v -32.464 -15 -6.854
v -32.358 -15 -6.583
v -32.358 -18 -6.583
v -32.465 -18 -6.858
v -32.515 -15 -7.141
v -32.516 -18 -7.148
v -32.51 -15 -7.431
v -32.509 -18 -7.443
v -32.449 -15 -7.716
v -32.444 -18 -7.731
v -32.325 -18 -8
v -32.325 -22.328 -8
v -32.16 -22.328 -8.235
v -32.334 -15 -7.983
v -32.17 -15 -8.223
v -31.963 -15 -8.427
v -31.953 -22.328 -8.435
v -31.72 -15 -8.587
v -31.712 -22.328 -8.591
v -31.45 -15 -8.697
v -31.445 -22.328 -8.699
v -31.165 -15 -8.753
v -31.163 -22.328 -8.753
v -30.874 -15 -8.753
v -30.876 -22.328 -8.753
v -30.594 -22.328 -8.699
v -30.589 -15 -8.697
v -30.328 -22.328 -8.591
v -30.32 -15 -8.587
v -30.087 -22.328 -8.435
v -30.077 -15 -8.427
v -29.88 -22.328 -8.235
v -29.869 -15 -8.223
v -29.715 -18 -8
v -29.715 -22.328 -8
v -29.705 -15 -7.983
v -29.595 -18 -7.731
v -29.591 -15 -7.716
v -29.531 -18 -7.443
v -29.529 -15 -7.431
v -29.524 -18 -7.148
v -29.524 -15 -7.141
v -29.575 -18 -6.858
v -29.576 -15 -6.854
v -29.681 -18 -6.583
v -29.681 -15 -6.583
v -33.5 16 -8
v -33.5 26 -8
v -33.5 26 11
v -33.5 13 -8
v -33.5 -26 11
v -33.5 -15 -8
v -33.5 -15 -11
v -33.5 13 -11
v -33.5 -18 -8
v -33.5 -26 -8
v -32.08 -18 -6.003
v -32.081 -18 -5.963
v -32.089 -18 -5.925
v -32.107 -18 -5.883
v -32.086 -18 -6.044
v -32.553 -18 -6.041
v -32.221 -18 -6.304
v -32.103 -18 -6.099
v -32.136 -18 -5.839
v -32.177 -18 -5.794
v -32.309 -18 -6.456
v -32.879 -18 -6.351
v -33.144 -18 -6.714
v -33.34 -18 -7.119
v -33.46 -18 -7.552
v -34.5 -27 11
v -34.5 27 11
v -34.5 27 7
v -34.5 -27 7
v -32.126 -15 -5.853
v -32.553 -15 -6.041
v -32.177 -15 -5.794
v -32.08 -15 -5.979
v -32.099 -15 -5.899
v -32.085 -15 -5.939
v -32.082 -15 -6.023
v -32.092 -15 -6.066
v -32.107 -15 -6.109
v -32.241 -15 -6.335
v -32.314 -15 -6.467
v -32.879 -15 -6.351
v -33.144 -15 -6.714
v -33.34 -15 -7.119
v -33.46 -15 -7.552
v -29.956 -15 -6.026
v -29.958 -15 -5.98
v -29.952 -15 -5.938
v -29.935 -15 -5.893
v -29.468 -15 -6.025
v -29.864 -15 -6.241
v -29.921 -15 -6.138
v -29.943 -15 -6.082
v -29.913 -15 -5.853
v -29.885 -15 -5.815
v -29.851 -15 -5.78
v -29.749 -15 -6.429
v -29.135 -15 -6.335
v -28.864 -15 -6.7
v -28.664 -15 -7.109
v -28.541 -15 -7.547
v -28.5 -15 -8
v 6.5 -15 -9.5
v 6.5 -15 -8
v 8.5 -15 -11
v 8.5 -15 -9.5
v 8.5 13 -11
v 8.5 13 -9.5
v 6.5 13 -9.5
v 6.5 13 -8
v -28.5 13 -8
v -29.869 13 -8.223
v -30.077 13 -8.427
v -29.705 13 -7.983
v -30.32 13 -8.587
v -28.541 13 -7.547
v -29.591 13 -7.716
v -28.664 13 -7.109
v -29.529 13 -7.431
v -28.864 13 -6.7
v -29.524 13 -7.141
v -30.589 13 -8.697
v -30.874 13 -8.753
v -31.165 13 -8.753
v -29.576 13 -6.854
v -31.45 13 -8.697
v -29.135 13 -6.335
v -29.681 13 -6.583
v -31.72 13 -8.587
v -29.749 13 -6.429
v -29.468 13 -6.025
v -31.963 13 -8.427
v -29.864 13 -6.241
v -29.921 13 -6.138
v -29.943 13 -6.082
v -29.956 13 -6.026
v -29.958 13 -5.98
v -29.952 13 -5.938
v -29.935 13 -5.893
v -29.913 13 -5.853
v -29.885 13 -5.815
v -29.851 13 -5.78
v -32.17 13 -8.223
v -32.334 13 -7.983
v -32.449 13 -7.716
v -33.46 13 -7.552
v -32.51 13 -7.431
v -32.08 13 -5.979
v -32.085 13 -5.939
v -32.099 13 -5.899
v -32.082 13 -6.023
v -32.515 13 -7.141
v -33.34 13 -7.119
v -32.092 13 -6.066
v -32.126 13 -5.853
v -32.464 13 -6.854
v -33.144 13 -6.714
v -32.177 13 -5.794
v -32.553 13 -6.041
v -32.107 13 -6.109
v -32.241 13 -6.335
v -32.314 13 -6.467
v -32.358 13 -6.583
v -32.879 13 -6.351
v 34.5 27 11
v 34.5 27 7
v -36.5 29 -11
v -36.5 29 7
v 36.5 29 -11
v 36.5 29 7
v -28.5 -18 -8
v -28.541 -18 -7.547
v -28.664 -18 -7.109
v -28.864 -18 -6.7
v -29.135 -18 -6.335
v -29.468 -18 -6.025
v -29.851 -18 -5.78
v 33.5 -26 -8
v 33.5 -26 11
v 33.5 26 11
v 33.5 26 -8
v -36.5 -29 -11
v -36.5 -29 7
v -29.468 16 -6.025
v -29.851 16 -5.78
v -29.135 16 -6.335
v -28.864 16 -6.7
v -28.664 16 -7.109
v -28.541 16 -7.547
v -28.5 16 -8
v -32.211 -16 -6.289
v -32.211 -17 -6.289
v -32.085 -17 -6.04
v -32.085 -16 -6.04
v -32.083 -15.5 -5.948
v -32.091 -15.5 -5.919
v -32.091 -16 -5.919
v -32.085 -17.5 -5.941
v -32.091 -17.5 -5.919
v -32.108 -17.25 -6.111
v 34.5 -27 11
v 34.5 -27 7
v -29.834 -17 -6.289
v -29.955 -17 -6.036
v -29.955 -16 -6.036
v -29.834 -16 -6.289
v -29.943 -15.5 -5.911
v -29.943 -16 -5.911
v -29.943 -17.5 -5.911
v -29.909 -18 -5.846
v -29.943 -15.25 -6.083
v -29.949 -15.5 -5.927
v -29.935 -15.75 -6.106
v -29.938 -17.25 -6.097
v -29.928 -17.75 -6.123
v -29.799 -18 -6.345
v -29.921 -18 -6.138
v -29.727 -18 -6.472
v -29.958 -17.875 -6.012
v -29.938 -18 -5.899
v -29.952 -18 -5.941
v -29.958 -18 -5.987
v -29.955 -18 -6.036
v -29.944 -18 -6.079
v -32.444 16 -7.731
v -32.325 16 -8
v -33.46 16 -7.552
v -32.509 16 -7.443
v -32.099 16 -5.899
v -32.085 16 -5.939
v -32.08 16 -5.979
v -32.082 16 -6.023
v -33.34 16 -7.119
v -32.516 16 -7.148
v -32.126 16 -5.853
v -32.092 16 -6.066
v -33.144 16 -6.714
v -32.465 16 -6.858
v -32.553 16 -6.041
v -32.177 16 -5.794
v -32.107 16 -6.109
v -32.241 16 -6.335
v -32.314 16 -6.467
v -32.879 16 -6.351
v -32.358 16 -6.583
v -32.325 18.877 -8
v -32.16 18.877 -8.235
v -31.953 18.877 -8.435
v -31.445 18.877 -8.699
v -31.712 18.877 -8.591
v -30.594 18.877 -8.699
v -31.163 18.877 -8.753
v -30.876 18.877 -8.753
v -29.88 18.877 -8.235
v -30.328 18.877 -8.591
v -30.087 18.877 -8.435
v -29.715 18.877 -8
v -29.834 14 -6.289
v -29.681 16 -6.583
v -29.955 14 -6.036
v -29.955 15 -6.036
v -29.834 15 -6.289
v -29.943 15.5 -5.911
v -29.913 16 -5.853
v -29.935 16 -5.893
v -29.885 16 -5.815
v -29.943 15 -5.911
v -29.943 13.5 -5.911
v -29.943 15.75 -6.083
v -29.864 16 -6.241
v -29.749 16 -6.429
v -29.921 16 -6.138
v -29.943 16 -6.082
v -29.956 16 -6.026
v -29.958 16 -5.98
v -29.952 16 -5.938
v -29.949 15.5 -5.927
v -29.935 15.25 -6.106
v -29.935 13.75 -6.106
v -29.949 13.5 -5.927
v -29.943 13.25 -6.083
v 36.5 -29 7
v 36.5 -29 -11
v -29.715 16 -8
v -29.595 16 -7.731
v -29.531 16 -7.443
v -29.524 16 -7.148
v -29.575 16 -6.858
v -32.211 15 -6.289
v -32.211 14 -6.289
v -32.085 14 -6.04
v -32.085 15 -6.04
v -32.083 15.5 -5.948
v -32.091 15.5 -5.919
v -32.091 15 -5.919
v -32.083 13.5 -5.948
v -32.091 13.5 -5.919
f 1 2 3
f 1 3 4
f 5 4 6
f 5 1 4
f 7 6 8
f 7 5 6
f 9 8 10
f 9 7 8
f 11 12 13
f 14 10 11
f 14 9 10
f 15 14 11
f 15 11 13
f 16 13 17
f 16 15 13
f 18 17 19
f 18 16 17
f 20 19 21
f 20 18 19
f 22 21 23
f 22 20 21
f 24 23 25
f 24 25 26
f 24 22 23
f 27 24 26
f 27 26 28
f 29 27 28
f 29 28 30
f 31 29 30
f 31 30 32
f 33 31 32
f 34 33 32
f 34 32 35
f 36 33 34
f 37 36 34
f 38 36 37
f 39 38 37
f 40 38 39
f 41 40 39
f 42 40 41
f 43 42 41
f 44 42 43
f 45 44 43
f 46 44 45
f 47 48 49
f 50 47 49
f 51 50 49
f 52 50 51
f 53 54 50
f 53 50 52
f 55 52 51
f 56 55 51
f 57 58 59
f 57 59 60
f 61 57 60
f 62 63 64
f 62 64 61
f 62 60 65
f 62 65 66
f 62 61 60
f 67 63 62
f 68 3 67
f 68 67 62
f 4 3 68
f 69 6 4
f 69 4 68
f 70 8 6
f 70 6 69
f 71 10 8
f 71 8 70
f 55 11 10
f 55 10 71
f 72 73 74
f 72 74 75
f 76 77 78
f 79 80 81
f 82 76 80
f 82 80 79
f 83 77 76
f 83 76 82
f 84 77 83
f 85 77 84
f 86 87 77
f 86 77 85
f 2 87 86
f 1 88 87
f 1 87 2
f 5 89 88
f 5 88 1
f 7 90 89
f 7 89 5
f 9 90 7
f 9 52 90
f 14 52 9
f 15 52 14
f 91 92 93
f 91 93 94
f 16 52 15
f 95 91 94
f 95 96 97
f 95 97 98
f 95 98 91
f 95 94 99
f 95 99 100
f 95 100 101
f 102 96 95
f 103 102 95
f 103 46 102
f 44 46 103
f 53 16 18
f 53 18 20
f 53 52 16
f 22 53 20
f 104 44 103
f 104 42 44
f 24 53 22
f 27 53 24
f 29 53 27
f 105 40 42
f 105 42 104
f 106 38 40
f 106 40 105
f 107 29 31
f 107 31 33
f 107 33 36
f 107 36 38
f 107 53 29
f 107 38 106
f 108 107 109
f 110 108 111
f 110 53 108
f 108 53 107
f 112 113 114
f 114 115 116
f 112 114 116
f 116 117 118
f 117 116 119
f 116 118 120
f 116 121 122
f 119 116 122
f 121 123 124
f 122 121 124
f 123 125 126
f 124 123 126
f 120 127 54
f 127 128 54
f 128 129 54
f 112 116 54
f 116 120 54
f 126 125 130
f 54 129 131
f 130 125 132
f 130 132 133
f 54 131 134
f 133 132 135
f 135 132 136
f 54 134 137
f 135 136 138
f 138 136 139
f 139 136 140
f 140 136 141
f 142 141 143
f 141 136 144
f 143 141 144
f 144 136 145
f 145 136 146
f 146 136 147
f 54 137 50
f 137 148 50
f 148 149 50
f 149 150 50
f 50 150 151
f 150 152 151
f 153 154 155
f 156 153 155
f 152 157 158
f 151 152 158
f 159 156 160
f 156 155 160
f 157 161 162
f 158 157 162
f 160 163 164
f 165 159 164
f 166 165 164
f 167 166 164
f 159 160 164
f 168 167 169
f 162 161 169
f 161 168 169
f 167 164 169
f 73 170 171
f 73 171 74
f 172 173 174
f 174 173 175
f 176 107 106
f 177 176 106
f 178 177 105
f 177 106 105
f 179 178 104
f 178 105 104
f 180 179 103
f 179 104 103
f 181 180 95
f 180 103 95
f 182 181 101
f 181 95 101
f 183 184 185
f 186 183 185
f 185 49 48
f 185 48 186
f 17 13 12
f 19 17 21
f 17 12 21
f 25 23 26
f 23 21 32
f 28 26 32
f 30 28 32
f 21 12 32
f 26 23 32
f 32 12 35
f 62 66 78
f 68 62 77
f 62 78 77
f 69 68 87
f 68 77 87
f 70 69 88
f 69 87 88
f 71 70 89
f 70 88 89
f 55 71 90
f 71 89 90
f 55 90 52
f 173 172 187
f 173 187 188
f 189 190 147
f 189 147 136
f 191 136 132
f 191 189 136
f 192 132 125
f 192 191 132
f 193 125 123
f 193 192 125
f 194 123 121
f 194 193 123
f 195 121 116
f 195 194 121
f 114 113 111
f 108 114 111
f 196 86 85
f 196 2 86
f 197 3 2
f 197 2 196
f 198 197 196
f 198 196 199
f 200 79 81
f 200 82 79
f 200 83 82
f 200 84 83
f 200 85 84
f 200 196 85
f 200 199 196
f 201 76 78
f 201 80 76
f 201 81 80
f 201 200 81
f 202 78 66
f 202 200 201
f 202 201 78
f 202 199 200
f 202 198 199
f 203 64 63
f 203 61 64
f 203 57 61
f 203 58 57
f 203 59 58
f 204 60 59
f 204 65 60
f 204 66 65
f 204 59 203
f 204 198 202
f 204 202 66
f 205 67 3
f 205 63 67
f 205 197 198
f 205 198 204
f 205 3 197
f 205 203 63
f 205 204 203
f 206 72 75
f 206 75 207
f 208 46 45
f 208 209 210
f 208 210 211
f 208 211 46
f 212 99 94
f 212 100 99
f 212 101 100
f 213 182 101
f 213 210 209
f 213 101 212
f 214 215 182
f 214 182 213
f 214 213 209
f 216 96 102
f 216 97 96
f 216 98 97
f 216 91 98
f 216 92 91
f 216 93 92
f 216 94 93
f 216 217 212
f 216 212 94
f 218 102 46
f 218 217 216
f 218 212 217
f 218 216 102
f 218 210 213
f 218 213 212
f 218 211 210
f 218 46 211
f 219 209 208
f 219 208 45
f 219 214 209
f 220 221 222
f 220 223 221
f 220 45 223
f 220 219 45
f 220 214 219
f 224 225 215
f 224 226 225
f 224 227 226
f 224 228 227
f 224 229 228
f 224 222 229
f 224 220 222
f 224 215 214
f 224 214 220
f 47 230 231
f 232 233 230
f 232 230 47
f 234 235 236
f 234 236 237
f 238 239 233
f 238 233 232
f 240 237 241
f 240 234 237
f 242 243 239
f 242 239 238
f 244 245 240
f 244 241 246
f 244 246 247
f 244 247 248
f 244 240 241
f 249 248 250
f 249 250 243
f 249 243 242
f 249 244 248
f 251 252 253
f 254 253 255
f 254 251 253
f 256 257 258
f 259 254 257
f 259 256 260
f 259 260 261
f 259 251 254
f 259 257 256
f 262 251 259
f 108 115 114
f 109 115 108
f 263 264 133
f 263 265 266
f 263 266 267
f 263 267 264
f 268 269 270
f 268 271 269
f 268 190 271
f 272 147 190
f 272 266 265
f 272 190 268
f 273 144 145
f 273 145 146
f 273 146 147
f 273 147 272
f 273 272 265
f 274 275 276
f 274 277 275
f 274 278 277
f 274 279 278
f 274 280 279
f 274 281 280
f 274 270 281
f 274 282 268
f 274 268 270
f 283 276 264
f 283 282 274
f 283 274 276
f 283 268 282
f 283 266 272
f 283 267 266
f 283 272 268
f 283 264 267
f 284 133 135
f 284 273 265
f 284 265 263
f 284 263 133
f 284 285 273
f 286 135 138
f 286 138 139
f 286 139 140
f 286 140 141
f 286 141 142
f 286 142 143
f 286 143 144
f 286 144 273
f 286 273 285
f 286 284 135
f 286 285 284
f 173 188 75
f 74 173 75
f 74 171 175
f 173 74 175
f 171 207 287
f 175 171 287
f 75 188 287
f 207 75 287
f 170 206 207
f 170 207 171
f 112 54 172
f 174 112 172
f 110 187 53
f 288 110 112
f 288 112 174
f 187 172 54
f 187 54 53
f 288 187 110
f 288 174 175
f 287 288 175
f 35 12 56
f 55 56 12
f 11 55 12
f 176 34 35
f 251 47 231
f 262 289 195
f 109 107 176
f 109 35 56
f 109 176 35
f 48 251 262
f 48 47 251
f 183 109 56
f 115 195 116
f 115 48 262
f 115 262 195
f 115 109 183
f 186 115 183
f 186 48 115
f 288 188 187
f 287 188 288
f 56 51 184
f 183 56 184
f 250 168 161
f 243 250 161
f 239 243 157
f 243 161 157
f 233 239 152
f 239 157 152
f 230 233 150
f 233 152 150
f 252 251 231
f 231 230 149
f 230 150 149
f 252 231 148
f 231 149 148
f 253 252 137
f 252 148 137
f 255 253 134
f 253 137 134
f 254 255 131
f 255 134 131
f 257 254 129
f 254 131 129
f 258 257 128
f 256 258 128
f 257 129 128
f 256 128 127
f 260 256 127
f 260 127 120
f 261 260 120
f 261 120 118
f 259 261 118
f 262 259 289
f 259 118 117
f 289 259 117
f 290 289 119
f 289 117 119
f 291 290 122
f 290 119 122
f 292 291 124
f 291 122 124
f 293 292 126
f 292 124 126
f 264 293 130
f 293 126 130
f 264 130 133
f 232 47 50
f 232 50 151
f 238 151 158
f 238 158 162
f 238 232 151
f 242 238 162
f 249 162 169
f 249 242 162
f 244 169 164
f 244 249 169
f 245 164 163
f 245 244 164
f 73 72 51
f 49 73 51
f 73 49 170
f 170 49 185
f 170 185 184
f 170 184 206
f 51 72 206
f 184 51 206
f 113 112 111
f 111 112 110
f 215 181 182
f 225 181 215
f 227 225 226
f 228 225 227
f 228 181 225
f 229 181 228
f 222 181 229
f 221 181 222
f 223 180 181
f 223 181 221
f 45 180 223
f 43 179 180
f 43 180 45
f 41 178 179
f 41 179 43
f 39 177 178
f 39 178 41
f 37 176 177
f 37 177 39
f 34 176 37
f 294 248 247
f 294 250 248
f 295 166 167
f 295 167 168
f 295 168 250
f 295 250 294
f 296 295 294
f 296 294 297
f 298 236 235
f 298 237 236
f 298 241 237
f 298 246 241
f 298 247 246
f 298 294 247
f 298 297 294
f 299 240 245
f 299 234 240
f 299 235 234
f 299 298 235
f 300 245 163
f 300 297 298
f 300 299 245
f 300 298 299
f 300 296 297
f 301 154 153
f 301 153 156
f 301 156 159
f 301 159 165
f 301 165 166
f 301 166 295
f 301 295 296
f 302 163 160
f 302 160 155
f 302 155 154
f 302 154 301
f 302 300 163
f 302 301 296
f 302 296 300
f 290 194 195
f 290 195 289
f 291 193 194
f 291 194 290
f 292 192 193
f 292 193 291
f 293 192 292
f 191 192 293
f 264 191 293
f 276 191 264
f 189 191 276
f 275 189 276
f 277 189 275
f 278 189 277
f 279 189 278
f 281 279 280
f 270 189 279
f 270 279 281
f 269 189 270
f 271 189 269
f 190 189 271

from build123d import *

# Parameters (mm, degrees)
F0_W      = 73
F0_H      = 22
F1_DEPTH  = 29
F2_W      = 67
F2_H      = 52
F3_DEPTH  = 19
F4_W      = 58
F4_H      = 4
F5_DEPTH  = 2
F6_W      = 71
F6_H      = 4
F7_DEPTH  = 2
F8_W      = 56
F8_H      = 4
F9_DEPTH  = 2
F10_W     = 69
F10_H     = 4
F11_DEPTH = 2
F12_W     = 42
F12_H     = 28
F13_DEPTH = 22.001
F14_W     = 2.5
F14_H     = 3
F16_W     = 2.5
F16_H     = 3
F18_R     = 1.5
F19_DEPTH = 35.32766
F20_DEPTH = 5.87666
F22_DEPTH = 38.628
F23_W     = 28
F23_H     = 1.5
F24_DEPTH = 2


with BuildPart() as f1:
    # F0 (on Front) → F1 (new body, symmetric)
    with BuildSketch(Plane.XZ):
        Rectangle(F0_W, F0_H)
    extrude(amount=F1_DEPTH, both=True)

    # F2 (on face) → F3 (cut)
    with BuildSketch(Plane.XY.offset(11)):
        Rectangle(F2_W, F2_H)
    extrude(amount=-F3_DEPTH, mode=Mode.SUBTRACT)

    # F4 (on face) → F5 (cut)
    with BuildSketch(Plane.YZ.offset(36.5)):
        with Locations((0, 9)):
            Rectangle(F4_W, F4_H)
    extrude(amount=-F5_DEPTH, mode=Mode.SUBTRACT)

    # F6 (on face) → F7 (cut)
    with BuildSketch(Plane.XZ.offset(29)):
        with Locations((-1, 9)):
            Rectangle(F6_W, F6_H)
    extrude(amount=-F7_DEPTH, mode=Mode.SUBTRACT)

    # F8 (on face) → F9 (cut)
    with BuildSketch(Plane(origin=(-36.5, 0, 0), x_dir=(0, -1, 0), z_dir=(-1, 0, 0))):
        with Locations((-1, 9)):
            Rectangle(F8_W, F8_H)
    extrude(amount=-F9_DEPTH, mode=Mode.SUBTRACT)

    # F10 (on face) → F11 (cut)
    with BuildSketch(Plane(origin=(0, 29, 0), x_dir=(-1, 0, 0), z_dir=(0, 1, 0))):
        with Locations((0, 9)):
            Rectangle(F10_W, F10_H)
    extrude(amount=-F11_DEPTH, mode=Mode.SUBTRACT)

    # F12 (on face) → F13 (cut, through all)
    with BuildSketch(Plane(origin=(0, 0, -11), x_dir=(1, 0, 0), z_dir=(0, 0, -1))):
        with Locations((-12.5, 1)):
            Rectangle(F12_W, F12_H)
    extrude(amount=-F13_DEPTH, mode=Mode.SUBTRACT)

    # F14 (on face) → F15 (revolve)
    with BuildSketch(Plane.XY.offset(-8)):
        with Locations((-32.25, -16.5)):
            Rectangle(F14_W, F14_H)
    revolve(axis=Axis((-31, -16.5, -8), (0, -1, 0)))

    # F16 (on face) → F17 (revolve)
    with BuildSketch(Plane.XY.offset(-8)):
        with Locations((-32.25, 14.5)):
            Rectangle(F16_W, F16_H)
    revolve(axis=Axis((-31, 14.5, -8), (0, 1, 0)))

    # F18 (on face) → F19 (cut)
    with BuildSketch(Plane.XZ.offset(-13)):
        with Locations((-31.0196849202, -7.260261868)):
            Circle(F18_R)
    extrude(amount=F19_DEPTH, mode=Mode.SUBTRACT)

    # F18 (on face) → F20 (cut)
    with BuildSketch(Plane.XZ.offset(-13)):
        with Locations((-31.0196849202, -7.260261868)):
            Circle(F18_R)
    extrude(amount=-F20_DEPTH, mode=Mode.SUBTRACT)

    # F21 (on face) → F22 (cut)
    with BuildSketch(Plane.XZ.offset(18)):
        with BuildLine():
            add(Edge.make_bspline(
                [(-32.3582060158, -6.5832380305), (-32.2676000125, -6.2528454981), (-31.9089266521, -6.0518947977), (-32.1771532814, -5.7944818858)],
                knots=[0, 0, 0, 0, 0.8092690211, 0.8092690211, 0.8092690211, 0.8092690211], degree=3))
            ThreePointArc((-32.3582060158, -6.5832380305), (-31.0196849202, -5.760261868), (-29.6811638245, -6.5832380305))
            add(Edge.make_bspline(
                [(-29.8511186855, -5.7796235172), (-30.1309504135, -6.0518947977), (-29.7859304255, -6.2528454981), (-29.6811638245, -6.5832380305)],
                knots=[0, 0, 0, 0, 0.82138964, 0.82138964, 0.82138964, 0.82138964], degree=3))
            ThreePointArc((-29.8511186855, -5.7796235172), (-31.0159693083, -5.5000510043), (-32.1771532814, -5.7944818858))
        make_face()
    extrude(amount=-F22_DEPTH, mode=Mode.SUBTRACT)

    # F23 (on face) → F24 (join)
    with BuildSketch(Plane(origin=(8.5, 0, 0), x_dir=(0, -1, 0), z_dir=(-1, 0, 0))):
        with Locations((1, -8.75)):
            Rectangle(F23_W, F23_H)
    extrude(amount=F24_DEPTH)


solid = f1.part
